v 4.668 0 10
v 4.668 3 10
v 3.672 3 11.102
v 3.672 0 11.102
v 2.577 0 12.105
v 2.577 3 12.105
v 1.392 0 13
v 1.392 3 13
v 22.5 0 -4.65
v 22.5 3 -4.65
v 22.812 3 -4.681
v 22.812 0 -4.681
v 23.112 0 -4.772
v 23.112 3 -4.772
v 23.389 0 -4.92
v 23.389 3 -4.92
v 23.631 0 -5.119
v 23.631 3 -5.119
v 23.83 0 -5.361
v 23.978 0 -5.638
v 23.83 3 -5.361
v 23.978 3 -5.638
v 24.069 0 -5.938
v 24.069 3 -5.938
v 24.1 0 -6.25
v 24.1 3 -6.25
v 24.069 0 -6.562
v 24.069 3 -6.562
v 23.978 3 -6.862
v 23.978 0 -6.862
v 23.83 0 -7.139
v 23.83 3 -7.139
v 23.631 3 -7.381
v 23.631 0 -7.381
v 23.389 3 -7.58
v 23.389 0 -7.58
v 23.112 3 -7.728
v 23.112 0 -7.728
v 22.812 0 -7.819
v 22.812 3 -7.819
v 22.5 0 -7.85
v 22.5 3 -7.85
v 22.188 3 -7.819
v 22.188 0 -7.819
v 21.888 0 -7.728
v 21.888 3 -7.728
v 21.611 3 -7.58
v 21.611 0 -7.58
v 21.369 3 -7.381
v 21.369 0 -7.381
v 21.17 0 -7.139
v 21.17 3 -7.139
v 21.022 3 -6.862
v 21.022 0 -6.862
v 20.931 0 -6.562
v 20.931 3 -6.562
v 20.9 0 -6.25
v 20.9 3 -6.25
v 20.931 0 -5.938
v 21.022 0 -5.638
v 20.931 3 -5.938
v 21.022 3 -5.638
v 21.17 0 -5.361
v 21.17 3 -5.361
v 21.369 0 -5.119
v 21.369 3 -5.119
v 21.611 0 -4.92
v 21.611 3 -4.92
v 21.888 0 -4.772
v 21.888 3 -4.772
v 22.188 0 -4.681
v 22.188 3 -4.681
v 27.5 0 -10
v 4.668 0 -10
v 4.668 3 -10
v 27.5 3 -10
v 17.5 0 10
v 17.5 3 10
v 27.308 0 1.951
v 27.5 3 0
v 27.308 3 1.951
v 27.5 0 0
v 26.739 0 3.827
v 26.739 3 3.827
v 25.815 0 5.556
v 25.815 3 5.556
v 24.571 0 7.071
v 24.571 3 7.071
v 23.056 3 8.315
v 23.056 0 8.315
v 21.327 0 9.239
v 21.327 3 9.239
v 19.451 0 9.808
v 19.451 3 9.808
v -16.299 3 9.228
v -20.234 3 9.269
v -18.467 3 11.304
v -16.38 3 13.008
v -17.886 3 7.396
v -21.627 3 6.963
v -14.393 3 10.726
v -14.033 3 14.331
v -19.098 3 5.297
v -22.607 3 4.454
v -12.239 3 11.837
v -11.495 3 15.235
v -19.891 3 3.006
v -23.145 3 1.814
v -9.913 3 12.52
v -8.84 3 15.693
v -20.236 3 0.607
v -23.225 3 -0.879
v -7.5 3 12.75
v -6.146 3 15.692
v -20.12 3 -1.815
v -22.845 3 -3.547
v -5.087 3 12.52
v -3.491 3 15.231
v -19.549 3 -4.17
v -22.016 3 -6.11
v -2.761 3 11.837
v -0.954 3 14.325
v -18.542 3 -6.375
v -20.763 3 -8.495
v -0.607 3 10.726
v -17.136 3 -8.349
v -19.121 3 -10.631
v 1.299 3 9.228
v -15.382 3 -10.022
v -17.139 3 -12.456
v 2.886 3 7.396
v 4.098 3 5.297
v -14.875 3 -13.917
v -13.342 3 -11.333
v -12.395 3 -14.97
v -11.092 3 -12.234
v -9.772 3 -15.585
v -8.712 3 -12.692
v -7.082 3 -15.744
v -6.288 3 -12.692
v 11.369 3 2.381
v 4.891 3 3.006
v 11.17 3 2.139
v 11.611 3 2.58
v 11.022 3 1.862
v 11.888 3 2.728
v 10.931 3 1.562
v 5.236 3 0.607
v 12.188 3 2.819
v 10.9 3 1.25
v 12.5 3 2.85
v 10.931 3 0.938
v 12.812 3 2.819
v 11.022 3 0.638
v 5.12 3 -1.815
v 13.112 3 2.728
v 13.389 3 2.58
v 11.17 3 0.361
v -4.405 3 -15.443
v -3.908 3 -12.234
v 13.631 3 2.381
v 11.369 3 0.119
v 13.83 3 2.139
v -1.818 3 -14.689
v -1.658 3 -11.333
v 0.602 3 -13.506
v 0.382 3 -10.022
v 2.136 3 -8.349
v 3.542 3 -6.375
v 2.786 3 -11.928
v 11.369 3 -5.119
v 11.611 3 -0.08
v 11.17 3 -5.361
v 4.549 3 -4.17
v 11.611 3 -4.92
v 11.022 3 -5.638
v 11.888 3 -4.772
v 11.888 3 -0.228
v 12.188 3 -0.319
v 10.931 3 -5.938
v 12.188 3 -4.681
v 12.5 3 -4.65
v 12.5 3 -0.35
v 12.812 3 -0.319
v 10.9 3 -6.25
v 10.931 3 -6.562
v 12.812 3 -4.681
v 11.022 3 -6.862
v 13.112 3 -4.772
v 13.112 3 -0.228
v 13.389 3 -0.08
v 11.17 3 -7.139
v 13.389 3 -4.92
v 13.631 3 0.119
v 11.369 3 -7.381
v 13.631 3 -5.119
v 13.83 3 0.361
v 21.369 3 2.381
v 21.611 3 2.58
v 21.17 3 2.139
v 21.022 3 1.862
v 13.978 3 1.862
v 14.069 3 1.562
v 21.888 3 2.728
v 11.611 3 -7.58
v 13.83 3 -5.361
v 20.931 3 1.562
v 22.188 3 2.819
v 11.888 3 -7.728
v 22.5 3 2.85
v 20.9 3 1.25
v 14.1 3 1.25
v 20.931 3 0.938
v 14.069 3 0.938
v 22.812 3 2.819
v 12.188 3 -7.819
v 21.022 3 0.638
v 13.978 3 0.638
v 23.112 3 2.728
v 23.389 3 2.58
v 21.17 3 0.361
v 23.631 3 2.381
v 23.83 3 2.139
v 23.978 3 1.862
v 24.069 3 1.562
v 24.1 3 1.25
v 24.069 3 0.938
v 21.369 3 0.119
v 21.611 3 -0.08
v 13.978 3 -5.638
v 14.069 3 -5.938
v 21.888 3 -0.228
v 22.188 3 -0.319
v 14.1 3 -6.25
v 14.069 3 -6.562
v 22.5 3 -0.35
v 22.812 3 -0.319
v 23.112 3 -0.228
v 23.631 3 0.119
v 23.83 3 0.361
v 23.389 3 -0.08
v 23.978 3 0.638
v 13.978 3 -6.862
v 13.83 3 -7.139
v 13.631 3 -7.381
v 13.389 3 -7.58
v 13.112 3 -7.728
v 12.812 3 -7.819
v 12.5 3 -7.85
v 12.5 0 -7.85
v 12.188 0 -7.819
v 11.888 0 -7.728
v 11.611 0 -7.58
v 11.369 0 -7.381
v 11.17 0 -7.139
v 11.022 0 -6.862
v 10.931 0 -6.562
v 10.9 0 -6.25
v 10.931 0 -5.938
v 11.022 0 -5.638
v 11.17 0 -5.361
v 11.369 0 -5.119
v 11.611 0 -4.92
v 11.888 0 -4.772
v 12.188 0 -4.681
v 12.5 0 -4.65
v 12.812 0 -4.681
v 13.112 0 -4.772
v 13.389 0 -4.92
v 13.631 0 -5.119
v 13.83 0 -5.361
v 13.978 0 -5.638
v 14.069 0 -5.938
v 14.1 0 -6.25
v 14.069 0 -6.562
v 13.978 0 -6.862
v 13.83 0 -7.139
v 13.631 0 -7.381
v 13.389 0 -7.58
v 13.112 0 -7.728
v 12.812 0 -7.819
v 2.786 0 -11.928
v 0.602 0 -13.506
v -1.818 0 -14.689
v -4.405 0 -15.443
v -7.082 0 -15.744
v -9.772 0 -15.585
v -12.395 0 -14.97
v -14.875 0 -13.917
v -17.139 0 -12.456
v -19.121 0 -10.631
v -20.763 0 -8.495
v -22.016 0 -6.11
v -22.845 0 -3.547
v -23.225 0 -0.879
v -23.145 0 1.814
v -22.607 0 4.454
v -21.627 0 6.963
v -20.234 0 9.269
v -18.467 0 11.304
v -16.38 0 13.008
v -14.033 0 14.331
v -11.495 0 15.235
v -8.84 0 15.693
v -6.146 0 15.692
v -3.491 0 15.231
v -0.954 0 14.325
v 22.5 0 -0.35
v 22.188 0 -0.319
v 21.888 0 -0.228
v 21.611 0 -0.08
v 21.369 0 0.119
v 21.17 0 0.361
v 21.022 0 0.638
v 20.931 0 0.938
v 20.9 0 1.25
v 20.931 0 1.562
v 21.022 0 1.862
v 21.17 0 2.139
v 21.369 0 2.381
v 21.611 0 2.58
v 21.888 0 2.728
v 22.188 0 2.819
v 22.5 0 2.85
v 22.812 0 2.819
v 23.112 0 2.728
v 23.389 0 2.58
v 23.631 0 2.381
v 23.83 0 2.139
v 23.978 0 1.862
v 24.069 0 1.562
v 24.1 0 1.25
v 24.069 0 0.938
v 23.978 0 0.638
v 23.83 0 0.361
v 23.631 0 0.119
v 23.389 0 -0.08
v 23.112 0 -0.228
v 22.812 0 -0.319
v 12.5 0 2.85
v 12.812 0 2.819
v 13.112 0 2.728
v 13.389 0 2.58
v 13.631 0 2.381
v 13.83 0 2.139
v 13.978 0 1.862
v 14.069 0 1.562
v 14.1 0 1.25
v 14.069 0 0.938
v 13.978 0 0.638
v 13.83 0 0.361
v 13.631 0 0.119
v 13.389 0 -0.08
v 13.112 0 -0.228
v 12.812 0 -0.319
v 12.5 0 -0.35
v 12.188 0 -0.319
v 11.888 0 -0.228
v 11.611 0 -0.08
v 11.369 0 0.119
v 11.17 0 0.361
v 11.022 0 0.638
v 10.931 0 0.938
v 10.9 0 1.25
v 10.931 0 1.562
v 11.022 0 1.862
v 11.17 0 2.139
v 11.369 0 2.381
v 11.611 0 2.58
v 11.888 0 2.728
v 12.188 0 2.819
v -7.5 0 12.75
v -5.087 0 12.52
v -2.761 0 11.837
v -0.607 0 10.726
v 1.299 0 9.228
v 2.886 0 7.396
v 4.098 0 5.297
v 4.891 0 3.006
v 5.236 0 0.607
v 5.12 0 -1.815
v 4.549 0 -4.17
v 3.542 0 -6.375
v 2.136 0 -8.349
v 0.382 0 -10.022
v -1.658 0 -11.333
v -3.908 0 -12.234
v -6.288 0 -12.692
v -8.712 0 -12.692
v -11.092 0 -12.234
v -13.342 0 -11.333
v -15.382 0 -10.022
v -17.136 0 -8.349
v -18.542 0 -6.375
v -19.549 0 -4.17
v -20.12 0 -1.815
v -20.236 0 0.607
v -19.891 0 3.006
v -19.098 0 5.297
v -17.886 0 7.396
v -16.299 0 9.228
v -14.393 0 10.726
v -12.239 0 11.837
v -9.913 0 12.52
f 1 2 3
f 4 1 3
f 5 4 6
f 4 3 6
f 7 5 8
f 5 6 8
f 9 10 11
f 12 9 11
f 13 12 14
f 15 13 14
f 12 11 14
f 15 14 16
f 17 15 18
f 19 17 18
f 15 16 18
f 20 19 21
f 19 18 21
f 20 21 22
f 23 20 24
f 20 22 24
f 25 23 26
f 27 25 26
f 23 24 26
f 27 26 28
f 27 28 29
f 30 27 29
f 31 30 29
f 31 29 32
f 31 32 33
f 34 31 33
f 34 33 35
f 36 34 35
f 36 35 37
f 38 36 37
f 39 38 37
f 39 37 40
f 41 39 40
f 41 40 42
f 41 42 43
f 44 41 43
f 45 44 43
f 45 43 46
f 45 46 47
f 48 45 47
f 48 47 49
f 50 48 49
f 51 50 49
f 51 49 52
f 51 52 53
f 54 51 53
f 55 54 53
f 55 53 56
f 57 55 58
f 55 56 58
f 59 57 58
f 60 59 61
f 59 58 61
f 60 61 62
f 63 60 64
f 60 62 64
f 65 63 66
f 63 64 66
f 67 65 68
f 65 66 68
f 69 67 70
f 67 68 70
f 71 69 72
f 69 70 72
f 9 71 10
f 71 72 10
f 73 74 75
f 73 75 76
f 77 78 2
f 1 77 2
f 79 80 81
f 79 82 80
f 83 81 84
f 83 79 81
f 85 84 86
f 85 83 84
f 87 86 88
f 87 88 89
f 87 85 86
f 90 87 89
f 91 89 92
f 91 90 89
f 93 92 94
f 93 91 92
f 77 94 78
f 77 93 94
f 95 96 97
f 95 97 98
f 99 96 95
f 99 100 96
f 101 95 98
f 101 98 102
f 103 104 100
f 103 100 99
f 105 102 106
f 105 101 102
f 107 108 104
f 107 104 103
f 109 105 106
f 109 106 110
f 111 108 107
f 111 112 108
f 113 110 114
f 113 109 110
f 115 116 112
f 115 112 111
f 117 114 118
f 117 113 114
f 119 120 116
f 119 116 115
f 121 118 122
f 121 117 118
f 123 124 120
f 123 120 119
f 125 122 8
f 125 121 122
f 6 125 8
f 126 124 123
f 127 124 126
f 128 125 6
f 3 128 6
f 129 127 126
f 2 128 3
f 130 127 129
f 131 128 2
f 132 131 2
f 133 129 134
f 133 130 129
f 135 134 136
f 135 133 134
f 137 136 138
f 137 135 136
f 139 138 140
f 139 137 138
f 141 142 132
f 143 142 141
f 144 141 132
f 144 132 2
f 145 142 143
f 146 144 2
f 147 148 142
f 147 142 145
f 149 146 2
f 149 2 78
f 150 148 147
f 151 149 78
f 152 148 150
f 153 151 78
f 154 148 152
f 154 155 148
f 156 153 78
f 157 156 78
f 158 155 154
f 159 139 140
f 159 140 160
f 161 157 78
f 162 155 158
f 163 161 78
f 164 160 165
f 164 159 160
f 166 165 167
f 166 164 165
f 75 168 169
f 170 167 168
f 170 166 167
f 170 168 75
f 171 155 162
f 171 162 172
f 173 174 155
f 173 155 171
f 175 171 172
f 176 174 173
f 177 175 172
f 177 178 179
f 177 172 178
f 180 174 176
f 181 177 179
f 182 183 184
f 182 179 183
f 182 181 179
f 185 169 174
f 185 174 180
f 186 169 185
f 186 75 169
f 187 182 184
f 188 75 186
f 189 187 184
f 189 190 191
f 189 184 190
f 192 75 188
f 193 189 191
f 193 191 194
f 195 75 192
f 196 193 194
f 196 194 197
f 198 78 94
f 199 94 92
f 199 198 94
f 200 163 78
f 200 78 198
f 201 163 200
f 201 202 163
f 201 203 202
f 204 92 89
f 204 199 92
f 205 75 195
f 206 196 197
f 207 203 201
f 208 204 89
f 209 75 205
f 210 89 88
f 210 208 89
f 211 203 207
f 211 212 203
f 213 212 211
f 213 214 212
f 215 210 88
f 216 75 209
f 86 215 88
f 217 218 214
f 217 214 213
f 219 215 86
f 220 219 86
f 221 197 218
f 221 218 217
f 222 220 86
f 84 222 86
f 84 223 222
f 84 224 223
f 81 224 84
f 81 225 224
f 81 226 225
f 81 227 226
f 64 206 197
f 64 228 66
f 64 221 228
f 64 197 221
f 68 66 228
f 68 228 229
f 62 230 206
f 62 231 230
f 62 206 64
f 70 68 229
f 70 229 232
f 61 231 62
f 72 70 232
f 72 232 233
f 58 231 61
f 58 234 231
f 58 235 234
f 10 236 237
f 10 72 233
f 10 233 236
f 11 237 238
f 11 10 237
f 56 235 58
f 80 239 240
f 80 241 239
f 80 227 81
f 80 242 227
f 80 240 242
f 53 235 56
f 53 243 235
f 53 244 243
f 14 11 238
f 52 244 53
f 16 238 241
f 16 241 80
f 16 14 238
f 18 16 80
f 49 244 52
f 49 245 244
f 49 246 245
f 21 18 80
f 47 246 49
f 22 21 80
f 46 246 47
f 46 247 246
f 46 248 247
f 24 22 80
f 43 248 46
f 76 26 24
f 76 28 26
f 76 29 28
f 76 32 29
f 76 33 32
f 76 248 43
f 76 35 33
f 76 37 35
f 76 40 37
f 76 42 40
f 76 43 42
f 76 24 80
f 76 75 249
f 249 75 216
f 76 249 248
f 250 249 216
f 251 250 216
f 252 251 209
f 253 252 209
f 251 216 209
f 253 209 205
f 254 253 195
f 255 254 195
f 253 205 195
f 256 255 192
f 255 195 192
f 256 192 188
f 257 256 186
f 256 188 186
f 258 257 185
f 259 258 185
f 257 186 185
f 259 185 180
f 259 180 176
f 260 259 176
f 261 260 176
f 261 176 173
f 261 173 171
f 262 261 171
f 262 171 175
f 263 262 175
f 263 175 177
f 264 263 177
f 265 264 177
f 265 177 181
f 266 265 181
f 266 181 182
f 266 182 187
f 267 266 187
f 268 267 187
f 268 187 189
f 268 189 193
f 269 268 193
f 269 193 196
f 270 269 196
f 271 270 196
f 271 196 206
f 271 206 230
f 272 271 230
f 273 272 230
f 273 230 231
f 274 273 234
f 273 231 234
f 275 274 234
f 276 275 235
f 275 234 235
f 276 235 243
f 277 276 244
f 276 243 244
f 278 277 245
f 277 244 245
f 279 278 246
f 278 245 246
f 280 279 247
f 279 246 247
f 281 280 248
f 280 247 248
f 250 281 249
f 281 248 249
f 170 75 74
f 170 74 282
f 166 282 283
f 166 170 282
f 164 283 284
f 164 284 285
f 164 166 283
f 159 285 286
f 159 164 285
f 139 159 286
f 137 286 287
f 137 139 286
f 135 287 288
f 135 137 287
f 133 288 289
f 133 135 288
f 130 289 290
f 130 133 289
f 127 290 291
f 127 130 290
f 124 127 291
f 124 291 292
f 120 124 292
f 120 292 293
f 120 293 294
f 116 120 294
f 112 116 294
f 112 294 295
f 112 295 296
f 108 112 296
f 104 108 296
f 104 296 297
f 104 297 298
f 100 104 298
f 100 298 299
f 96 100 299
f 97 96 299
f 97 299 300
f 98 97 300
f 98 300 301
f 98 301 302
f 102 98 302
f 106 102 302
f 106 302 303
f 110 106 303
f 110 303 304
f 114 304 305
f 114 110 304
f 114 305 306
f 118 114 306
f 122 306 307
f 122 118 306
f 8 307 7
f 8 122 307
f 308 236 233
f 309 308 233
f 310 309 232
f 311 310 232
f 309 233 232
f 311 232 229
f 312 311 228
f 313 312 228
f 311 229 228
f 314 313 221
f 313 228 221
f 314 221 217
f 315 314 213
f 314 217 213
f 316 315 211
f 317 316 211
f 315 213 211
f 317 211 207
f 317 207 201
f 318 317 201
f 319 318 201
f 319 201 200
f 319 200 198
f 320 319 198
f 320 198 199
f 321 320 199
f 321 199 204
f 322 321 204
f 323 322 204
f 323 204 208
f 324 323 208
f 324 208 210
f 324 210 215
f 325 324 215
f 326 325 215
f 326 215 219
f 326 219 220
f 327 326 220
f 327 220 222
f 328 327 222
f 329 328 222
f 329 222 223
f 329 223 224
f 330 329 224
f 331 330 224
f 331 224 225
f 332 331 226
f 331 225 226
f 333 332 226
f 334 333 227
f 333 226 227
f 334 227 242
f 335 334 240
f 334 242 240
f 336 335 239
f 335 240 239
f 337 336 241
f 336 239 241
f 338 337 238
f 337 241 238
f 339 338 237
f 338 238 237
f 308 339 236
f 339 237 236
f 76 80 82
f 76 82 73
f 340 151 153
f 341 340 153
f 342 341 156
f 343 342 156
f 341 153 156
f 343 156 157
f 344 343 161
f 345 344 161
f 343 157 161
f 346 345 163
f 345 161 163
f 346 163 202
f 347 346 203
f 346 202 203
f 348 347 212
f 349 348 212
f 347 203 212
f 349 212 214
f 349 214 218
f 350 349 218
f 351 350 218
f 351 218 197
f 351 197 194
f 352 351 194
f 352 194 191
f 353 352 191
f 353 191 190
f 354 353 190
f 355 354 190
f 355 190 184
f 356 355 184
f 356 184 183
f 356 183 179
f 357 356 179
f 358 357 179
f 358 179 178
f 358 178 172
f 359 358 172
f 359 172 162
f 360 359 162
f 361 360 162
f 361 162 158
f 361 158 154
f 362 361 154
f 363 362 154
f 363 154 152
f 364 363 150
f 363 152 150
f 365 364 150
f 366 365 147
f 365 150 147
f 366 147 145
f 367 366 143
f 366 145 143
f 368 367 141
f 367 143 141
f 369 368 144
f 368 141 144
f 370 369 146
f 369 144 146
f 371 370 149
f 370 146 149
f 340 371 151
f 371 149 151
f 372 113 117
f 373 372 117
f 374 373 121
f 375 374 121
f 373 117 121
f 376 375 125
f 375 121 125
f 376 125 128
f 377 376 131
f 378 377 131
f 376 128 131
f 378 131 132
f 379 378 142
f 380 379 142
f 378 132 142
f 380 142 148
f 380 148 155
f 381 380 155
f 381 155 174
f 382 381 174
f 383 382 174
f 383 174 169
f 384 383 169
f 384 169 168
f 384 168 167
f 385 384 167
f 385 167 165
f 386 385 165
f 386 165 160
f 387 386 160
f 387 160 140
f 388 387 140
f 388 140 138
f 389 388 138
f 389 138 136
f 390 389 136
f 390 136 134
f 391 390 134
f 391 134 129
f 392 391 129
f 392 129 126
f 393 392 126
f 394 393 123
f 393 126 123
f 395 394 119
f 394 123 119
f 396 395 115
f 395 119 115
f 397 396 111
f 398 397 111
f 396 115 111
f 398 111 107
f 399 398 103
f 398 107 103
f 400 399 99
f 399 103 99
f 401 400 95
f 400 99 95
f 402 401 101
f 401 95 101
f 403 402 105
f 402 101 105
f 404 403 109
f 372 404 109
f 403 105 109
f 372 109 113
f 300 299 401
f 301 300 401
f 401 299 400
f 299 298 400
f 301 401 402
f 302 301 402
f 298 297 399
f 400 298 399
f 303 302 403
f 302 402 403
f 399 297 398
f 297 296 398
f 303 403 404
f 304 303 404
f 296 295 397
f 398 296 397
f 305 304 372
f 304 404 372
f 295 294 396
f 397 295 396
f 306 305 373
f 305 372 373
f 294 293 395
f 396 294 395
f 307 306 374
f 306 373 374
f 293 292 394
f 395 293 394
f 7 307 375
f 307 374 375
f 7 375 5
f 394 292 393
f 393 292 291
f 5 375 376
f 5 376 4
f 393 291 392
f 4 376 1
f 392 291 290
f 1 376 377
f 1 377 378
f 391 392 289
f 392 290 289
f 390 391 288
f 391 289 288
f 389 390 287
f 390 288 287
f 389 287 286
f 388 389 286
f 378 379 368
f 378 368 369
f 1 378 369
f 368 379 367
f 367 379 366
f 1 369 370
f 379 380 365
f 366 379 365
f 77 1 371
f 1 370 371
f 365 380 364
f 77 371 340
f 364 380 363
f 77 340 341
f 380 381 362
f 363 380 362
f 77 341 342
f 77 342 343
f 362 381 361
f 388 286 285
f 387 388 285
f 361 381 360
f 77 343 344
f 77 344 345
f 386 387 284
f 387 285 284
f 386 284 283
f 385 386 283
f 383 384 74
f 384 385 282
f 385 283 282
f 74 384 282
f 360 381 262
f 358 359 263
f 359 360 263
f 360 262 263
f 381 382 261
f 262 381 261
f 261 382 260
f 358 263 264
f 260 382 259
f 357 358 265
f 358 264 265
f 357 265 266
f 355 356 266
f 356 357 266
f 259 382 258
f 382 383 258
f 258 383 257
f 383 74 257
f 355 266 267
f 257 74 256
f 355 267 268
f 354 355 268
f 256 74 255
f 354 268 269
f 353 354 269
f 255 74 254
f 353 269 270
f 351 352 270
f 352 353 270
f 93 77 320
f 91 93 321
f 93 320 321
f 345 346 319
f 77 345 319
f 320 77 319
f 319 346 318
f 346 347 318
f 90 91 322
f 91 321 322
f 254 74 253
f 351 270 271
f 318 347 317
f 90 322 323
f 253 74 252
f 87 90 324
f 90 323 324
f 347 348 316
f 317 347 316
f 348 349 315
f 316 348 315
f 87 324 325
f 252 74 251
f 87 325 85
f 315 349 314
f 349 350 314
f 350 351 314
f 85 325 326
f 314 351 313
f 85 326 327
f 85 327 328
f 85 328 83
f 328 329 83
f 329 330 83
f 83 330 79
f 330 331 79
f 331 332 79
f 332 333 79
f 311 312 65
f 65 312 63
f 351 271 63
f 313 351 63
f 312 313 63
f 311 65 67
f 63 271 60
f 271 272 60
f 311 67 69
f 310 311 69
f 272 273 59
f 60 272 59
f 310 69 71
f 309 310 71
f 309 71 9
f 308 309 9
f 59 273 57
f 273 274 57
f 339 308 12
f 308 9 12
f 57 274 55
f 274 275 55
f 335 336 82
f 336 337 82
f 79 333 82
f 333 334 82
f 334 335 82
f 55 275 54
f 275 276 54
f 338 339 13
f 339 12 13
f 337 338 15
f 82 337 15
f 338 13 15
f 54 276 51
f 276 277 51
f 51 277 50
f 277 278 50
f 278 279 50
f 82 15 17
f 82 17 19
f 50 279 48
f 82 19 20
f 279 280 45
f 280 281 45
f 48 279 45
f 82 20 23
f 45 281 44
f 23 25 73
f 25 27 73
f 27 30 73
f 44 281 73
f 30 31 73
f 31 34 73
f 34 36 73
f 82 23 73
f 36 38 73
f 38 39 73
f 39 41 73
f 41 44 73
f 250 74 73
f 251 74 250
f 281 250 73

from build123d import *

# Parameters (mm, degrees)
SKETCH_1_W          = 55
SKETCH_1_H          = 20
EXTRUDE_1_DEPTH     = 3
SKETCH_2_R          = 1.6
SKETCH_2_R_2        = 6.75
CUT_EXTRUDE_1_DEPTH = 30.41513216
SKETCH_4_R          = 1.6
CUT_EXTRUDE_2_DEPTH = 30.41513216
EXTRUDE_2_DEPTH     = 3
SKETCH_6_R          = 1.6
CUT_EXTRUDE_3_DEPTH = 31.565503431
SKETCH_7_W          = 8
SKETCH_7_H          = 23
CUT_EXTRUDE_4_DEPTH = 31.565503431
SKETCH_9_R          = 18.063991313
EXTRUDE_4_DEPTH     = 3
SKETCH_10_R         = 12.75
CUT_EXTRUDE_6_DEPTH = 34.038731546
SKETCH_11_OUTSIDE_W = 67.918
SKETCH_11_OUTSIDE_H = 50.982
CUT_EXTRUDE_7_DEPTH = 34.038731546
SKETCH_12_OUTSIDE_W = 64.712
SKETCH_12_OUTSIDE_H = 45.462
CUT_EXTRUDE_8_DEPTH = 32.832569799
FILLET_1_R          = 10


with BuildPart() as part:
    # 草图1 → 凸台-拉伸1 (new body)
    with BuildSketch(Plane(origin=(0, 0, 0), x_dir=(1, 0, 0), z_dir=(0, 1, 0))):
        Rectangle(SKETCH_1_W, SKETCH_1_H)
    extrude(amount=EXTRUDE_1_DEPTH)

    # 草图2 → 切除-拉伸1 (cut, through all)
    with BuildSketch(Plane(origin=(0, 3, 0), x_dir=(1, 0, 0), z_dir=(0, 1, 0))):
        with Locations(Location((-15.727241336, 4.75, 0), (0, 0, 270))):
            Circle(SKETCH_2_R)
        with Locations((-7.5, -9.5)):
            Circle(SKETCH_2_R)
        with Locations(Location((0.727241336, 4.75, 0), (0, 0, 270))):
            Circle(SKETCH_2_R)
        with Locations(Location((-7.5, 0, 0), (0, 0, 270))):
            Circle(SKETCH_2_R_2)
    extrude(amount=-CUT_EXTRUDE_1_DEPTH, mode=Mode.SUBTRACT)

    # 草图4 → 切除-拉伸2 (cut, through all)
    with BuildSketch(Plane(origin=(0, 3, 0), x_dir=(1, 0, 0), z_dir=(0, 1, 0))):
        with Locations(Location((22.5, 6.25, 0), (0, 0, 270))):
            Circle(SKETCH_4_R)
        with Locations(Location((12.5, 6.25, 0), (0, 0, 90))):
            Circle(SKETCH_4_R)
        with Locations(Location((22.5, -1.25, 0), (0, 0, 90))):
            Circle(SKETCH_4_R)
        with Locations(Location((12.5, -1.25, 0), (0, 0, 270))):
            Circle(SKETCH_4_R)
    extrude(amount=-CUT_EXTRUDE_2_DEPTH, mode=Mode.SUBTRACT)

    # 草图5 → 凸台-拉伸2 (add)
    with BuildSketch(Plane(origin=(0, 3, 0), x_dir=(1, 0, 0), z_dir=(0, 1, 0))):
        Polygon((-27.5, -10), (-27.5, -13), (0, -13), (27.5, -13), (27.5, -10), align=None)
    extrude(amount=-EXTRUDE_2_DEPTH)

    # 草图6 → 切除-拉伸3 (cut, through all)
    with BuildSketch(Plane(origin=(0, 3, 0), x_dir=(1, 0, 0), z_dir=(0, 1, 0))):
        with Locations(Location((-7.5, -9.5, 0), (0, 0, 270))):
            Circle(SKETCH_6_R)
    extrude(amount=-CUT_EXTRUDE_3_DEPTH, mode=Mode.SUBTRACT)

    # 草图7 → 切除-拉伸4 (cut, through all)
    with BuildSketch(Plane(origin=(0, 3, 0), x_dir=(1, 0, 0), z_dir=(0, 1, 0))):
        with Locations((-23.5, -1.5)):
            Rectangle(SKETCH_7_W, SKETCH_7_H)
    extrude(amount=-CUT_EXTRUDE_4_DEPTH, mode=Mode.SUBTRACT)

    # 草图9 → 凸台-拉伸4 (add)
    with BuildSketch(Plane(origin=(0, 3, 0), x_dir=(1, 0, 0), z_dir=(0, 1, 0))):
        with Locations((-7.5, 0)):
            Circle(SKETCH_9_R)
    extrude(amount=-EXTRUDE_4_DEPTH)

    # 草图10 → 切除-拉伸6 (cut, through all)
    with BuildSketch(Plane(origin=(0, 3, 0), x_dir=(1, 0, 0), z_dir=(0, 1, 0))):
        with Locations(Location((-7.5, 0, 0), (0, 0, 270))):
            Circle(SKETCH_10_R)
    extrude(amount=-CUT_EXTRUDE_6_DEPTH, mode=Mode.SUBTRACT)

    # 草图11 outside → 切除-拉伸7 (cut, through all)
    with BuildSketch(Plane(origin=(0, 3, 0), x_dir=(1, 0, 0), z_dir=(0, 1, 0))):
        with Locations((0.968, 0)):
            Rectangle(SKETCH_11_OUTSIDE_W, SKETCH_11_OUTSIDE_H)
        with BuildLine():
            Line((27.5, 10), (4.668093524, 10))
            ThreePointArc((4.668093524, 10), (-23.092588853, 2.221187265), (1.391709622, -13))
            Line((1.391709622, -13), (27.5, -13))
            Line((27.5, -13), (27.5, 10))
        make_face(mode=Mode.SUBTRACT)
    extrude(amount=-CUT_EXTRUDE_7_DEPTH, mode=Mode.SUBTRACT)

    # 草图12 outside → 切除-拉伸8 (cut, through all)
    with BuildSketch(Plane(origin=(0, 3, 0), x_dir=(1, 0, 0), z_dir=(0, 1, 0))):
        with Locations((2.125, 0)):
            Rectangle(SKETCH_12_OUTSIDE_W, SKETCH_12_OUTSIDE_H)
        with BuildLine():
            Line((27.5, 10), (27.5, -10))
            Line((27.5, -10), (4.668093524, -10))
            ThreePointArc((4.668093524, -10), (-23.25, 0), (4.668093524, 10))
            Line((4.668093524, 10), (27.5, 10))
        make_face(mode=Mode.SUBTRACT)
    extrude(amount=-CUT_EXTRUDE_8_DEPTH, mode=Mode.SUBTRACT)

    # 圆角1
    fillet_1_edges = [part.edges().sort_by_distance(p)[0] for p in [
        (27.5, 1.5, 10),
    ]]
    fillet(fillet_1_edges, radius=FILLET_1_R)


solid = part.part
